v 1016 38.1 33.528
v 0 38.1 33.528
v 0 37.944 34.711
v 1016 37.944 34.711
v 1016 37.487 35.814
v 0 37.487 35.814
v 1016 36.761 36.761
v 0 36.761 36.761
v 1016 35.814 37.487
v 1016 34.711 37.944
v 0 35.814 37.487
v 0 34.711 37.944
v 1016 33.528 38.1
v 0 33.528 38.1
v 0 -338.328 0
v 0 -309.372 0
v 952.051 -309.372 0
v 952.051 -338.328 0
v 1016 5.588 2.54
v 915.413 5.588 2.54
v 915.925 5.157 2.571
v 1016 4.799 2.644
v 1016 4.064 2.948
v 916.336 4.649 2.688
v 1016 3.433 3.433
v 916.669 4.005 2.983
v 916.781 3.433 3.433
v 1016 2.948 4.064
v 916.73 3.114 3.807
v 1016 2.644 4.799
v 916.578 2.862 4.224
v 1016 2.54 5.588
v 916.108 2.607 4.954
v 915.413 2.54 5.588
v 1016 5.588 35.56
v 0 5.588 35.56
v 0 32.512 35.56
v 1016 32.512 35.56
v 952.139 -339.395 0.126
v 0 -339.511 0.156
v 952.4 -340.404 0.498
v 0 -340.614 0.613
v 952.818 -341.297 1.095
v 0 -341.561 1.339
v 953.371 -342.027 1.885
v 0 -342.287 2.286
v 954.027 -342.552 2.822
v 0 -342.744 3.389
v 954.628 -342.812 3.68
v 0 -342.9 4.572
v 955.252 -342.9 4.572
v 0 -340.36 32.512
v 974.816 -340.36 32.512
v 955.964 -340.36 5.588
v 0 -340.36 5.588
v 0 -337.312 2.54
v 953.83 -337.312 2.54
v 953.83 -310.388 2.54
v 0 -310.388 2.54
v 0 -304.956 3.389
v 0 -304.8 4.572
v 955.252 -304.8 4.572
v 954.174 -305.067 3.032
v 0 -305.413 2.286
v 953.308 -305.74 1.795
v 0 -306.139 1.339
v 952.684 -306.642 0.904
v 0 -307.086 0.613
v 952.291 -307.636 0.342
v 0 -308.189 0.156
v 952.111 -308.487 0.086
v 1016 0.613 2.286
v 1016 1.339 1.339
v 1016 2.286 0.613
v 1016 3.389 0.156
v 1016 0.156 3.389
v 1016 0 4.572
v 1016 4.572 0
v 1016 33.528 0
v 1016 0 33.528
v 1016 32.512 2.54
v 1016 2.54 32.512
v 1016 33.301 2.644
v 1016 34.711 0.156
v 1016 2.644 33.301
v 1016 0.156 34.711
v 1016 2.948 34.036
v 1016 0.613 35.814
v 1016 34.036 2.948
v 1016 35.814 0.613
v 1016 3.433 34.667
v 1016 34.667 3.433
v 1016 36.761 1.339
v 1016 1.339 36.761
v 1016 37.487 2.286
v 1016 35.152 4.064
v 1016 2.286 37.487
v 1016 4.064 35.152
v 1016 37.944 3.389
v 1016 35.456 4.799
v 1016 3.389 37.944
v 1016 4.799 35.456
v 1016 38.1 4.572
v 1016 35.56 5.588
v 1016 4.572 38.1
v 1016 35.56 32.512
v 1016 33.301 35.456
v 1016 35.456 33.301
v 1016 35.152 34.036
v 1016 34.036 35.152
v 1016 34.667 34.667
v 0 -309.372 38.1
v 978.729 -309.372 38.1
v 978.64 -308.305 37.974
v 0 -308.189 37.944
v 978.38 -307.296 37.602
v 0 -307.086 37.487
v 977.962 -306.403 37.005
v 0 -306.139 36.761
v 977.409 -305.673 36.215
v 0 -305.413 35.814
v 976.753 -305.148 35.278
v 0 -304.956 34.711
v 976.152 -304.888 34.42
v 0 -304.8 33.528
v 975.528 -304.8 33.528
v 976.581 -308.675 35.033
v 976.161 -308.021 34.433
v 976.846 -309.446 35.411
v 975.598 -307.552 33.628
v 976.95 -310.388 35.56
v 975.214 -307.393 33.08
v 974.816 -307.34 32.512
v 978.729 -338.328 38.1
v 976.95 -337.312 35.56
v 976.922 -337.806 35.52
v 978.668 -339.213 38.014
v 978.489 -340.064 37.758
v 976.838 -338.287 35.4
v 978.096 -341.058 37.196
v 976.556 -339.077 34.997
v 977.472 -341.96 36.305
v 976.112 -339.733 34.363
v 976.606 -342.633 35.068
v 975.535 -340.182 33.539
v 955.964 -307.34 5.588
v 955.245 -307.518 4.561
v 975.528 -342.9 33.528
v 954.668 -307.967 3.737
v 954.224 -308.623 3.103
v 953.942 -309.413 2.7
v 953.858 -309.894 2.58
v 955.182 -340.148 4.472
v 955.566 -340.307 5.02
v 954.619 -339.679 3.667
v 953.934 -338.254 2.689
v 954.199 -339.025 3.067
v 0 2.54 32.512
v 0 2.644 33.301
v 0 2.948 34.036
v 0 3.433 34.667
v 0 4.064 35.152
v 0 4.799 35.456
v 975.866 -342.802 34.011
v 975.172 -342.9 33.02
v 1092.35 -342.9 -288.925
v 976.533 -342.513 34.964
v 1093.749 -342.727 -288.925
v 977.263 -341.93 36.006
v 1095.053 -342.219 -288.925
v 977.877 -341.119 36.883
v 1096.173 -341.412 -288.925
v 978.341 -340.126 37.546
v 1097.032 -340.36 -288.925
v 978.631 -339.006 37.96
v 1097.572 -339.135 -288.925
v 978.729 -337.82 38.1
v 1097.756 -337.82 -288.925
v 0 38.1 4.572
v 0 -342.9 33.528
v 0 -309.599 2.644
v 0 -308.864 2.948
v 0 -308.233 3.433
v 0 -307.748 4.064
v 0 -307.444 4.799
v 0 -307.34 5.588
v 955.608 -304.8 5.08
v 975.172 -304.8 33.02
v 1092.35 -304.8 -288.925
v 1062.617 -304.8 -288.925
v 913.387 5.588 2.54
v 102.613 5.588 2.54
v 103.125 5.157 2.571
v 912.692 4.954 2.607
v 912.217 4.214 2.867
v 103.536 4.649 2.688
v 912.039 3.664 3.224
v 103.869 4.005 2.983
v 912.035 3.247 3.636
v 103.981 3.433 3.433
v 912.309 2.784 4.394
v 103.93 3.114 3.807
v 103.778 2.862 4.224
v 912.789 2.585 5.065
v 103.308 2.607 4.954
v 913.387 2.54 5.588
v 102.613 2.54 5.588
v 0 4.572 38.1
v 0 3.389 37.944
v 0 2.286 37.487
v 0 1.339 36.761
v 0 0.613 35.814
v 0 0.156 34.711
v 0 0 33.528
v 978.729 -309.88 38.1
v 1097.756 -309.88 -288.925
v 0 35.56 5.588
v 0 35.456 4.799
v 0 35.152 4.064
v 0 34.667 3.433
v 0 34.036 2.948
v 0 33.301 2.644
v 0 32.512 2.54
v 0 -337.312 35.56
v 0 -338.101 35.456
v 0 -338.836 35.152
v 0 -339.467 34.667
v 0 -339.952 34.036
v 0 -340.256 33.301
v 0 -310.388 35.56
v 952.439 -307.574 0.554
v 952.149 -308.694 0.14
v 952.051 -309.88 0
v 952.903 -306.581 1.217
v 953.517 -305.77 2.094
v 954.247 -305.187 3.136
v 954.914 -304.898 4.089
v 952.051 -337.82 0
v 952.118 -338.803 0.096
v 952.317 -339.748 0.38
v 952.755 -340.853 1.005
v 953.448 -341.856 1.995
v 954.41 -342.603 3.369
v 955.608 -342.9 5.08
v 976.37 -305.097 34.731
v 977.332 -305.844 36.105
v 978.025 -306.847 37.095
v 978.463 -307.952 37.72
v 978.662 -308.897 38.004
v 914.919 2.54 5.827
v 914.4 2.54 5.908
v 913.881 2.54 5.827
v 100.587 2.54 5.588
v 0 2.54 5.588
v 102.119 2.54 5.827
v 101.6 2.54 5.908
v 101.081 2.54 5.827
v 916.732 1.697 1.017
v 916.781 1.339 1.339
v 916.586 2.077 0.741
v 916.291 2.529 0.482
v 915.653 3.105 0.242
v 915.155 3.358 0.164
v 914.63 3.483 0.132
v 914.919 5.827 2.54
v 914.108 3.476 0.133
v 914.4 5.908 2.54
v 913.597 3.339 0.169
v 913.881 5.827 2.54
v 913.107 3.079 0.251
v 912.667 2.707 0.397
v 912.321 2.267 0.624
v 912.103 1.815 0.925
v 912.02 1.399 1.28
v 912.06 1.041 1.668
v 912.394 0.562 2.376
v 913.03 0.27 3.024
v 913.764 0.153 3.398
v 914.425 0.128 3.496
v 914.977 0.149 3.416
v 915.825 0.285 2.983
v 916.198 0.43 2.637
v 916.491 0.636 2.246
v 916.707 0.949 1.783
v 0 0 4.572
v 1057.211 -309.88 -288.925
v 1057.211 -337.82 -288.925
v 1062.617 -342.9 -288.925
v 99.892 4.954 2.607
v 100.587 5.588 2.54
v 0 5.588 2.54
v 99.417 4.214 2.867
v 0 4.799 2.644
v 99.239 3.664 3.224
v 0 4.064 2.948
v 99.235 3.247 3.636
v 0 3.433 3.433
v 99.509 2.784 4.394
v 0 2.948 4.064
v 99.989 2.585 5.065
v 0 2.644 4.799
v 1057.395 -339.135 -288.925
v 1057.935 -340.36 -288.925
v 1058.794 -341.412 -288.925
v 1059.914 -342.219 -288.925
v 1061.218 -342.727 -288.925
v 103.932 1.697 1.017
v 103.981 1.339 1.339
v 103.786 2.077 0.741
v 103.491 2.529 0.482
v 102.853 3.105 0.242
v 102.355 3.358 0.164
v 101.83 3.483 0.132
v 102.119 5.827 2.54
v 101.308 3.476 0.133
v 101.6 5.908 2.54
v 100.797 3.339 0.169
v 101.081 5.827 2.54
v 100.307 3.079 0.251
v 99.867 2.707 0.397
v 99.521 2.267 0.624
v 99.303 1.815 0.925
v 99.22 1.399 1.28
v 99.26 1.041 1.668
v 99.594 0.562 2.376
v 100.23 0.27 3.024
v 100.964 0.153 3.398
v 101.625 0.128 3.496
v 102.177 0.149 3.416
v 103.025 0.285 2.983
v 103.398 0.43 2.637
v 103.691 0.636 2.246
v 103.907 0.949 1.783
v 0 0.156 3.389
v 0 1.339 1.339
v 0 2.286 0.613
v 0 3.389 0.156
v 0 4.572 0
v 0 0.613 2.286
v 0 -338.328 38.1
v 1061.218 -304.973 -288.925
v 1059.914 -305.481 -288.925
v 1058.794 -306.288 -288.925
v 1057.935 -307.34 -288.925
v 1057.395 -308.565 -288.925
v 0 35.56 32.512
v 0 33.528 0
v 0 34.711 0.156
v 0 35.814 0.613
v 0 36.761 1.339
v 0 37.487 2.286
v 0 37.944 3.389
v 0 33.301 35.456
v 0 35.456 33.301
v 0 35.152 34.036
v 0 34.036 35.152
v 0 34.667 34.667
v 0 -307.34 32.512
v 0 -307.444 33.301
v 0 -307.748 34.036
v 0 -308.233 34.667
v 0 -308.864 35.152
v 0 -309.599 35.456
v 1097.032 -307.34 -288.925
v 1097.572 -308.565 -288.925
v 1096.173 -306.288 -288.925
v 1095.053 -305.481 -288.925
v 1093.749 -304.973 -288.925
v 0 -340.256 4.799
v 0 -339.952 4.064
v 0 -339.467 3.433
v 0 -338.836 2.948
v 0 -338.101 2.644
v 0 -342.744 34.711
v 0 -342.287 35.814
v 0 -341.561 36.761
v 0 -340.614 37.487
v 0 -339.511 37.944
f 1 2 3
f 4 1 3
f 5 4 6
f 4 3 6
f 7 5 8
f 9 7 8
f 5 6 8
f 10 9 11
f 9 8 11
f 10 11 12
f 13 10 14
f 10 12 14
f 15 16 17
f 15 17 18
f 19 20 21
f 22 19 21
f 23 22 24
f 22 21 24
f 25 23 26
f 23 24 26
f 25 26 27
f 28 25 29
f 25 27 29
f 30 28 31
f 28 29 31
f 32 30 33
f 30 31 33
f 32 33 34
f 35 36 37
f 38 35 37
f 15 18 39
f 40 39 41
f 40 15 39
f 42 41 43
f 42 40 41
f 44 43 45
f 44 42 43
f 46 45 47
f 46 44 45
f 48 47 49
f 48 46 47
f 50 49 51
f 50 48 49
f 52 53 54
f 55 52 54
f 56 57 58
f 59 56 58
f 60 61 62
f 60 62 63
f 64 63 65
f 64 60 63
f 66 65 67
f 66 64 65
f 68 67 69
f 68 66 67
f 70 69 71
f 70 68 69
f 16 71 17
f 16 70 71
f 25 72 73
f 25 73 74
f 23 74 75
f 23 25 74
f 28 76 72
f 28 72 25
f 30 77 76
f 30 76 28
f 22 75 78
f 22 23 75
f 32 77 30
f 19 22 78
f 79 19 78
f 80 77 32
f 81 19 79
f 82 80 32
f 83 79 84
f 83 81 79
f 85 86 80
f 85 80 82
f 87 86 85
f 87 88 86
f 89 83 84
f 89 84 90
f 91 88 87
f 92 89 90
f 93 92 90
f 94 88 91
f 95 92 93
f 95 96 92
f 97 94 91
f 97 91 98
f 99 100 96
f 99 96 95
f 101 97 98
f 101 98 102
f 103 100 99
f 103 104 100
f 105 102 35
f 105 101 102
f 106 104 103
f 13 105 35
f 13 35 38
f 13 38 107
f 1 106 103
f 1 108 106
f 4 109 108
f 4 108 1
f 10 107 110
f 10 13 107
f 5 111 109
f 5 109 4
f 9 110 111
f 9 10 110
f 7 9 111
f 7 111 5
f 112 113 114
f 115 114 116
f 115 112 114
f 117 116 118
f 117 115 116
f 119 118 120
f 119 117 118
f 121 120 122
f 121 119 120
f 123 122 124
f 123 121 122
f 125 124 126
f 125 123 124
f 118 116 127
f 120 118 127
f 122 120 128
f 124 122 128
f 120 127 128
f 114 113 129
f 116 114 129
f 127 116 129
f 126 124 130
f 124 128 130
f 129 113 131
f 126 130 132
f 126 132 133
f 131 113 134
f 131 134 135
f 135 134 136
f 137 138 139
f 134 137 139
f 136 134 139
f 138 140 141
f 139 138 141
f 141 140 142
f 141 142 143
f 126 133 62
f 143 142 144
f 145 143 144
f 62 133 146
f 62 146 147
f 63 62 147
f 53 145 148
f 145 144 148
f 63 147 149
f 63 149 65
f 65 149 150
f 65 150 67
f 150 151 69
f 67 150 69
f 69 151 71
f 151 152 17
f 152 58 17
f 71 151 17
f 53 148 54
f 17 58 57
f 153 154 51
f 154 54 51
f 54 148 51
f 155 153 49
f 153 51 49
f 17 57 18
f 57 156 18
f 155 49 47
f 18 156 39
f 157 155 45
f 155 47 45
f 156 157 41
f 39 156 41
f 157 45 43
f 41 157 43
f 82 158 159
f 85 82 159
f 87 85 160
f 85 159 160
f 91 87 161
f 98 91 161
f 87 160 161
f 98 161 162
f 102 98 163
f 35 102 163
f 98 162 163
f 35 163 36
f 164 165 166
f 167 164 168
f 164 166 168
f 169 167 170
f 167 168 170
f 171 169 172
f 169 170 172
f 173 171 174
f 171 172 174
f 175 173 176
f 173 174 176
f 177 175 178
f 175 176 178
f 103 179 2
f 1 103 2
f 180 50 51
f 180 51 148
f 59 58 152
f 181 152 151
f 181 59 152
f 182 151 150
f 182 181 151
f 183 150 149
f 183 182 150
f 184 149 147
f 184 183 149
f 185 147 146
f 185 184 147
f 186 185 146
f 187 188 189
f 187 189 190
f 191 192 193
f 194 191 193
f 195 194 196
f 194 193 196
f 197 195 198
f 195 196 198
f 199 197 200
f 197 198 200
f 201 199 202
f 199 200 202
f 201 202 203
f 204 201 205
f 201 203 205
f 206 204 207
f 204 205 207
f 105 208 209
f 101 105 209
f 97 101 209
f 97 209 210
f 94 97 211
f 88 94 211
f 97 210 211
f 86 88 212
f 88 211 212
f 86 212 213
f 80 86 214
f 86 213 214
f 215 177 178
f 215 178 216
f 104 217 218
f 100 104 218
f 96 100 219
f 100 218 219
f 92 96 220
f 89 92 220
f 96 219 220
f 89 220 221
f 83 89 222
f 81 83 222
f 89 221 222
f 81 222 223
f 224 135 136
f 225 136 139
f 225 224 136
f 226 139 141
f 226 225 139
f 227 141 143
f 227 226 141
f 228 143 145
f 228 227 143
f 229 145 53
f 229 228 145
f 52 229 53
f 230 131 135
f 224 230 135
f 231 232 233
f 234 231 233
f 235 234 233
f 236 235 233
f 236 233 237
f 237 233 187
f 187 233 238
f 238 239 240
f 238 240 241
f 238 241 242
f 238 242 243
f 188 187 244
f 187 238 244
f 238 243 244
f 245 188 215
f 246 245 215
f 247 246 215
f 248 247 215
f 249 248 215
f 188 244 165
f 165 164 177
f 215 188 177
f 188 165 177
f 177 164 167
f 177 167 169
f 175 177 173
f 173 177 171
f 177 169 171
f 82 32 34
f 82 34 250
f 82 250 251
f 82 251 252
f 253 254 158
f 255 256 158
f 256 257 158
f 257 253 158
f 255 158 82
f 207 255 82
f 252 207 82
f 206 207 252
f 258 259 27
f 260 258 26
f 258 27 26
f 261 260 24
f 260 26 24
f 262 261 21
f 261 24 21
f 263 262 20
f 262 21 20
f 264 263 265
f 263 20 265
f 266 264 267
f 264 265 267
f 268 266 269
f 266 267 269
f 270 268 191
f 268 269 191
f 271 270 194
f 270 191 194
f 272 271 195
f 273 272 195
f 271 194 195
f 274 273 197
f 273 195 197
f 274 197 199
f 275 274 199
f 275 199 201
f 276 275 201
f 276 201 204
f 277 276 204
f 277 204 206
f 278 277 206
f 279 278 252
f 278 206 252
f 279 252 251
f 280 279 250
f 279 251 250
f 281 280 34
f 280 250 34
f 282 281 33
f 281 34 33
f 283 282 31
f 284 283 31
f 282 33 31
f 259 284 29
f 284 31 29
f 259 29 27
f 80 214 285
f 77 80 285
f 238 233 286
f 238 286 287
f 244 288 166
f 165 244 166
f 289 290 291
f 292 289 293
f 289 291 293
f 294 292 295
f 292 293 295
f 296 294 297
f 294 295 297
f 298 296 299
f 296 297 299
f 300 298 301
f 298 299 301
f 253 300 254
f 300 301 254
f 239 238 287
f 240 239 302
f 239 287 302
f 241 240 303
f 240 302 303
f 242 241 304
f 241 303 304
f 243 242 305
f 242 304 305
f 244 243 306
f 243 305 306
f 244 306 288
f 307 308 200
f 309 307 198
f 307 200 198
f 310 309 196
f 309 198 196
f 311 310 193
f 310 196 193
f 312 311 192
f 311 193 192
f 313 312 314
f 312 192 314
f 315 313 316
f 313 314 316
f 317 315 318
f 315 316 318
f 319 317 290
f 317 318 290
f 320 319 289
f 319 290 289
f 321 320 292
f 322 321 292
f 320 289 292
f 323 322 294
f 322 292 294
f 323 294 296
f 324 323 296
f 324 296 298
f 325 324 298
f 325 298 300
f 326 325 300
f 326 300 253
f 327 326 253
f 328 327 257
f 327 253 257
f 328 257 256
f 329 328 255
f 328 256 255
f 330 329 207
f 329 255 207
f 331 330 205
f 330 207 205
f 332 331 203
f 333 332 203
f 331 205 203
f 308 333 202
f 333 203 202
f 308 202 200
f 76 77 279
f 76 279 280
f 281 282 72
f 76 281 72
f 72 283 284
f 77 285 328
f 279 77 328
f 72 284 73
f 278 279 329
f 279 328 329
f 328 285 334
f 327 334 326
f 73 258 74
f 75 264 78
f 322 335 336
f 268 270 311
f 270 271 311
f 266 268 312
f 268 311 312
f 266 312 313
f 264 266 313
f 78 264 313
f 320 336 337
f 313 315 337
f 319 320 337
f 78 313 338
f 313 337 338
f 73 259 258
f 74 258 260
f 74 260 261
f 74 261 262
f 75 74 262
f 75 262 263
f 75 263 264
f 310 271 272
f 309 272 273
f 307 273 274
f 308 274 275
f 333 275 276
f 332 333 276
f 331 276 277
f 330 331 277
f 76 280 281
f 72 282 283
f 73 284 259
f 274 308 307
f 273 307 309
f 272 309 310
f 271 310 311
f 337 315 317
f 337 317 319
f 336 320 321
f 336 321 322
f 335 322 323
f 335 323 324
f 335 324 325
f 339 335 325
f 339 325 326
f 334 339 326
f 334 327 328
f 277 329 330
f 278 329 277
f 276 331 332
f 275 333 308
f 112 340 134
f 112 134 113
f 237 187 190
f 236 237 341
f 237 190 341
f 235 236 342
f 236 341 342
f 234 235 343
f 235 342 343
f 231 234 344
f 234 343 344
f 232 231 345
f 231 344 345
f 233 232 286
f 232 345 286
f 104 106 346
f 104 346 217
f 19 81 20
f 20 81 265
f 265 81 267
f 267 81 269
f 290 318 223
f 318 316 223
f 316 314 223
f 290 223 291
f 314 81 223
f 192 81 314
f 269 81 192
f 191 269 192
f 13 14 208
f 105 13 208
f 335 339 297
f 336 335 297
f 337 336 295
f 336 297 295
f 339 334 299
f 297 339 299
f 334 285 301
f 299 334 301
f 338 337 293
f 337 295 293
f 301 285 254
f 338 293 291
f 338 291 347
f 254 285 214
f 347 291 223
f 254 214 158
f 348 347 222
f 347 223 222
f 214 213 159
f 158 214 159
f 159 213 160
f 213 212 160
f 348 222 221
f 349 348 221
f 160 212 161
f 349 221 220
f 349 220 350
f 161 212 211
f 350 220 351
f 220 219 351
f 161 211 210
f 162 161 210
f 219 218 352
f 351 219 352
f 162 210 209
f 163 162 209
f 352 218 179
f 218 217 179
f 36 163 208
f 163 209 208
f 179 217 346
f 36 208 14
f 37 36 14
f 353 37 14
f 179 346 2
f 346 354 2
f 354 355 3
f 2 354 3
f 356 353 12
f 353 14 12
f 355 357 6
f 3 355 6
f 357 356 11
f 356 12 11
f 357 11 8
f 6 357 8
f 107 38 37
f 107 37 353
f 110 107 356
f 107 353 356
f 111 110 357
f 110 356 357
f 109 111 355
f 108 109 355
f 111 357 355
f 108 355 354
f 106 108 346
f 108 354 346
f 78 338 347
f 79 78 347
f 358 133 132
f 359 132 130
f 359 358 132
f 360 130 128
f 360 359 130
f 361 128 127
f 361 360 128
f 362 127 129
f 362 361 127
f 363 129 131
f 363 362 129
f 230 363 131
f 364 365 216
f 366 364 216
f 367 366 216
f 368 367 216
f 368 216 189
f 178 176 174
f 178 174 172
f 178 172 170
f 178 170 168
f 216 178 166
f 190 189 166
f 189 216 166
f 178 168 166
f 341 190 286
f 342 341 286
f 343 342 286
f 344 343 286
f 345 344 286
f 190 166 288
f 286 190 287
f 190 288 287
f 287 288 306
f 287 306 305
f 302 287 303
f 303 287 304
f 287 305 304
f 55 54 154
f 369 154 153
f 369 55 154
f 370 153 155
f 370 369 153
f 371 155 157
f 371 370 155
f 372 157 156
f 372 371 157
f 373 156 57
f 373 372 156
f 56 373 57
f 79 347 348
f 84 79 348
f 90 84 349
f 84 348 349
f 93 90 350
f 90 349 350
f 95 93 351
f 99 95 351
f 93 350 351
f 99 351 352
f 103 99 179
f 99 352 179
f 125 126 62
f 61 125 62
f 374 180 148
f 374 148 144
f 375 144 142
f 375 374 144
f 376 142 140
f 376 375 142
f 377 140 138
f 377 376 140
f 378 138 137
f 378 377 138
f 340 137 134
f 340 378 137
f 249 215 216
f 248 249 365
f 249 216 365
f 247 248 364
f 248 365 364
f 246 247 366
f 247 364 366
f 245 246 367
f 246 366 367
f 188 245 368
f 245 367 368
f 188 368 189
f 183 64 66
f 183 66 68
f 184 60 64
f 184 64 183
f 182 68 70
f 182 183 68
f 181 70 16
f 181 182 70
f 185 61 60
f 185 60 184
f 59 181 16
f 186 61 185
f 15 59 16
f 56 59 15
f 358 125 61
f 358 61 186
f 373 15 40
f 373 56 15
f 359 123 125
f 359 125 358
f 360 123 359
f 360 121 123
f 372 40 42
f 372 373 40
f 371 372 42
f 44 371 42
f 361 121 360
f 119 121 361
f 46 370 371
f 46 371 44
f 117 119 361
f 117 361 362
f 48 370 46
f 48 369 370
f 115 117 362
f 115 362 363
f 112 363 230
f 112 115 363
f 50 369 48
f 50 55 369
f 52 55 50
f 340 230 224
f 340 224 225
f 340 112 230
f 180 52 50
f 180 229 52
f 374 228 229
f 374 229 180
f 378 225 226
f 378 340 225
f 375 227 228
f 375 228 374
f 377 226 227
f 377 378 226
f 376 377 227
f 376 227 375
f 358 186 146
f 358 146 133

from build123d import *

# Parameters (mm, degrees)
F1_DEPTH      = 1016
F6_R          = 2.38125
F7_DEPTH      = 25.4
F7_DEPTH_BACK = 25.4
F9_DEPTH      = 50.8
F10_DEPTH     = 50.8
F13_REACH     = 736.6402660348
F15_DEPTH     = 50.8


with BuildPart() as f1:
    # F0 (on Right) → F1 (new body)
    with BuildSketch(Plane.YZ):
        with BuildLine():
            ThreePointArc((0, 4.572), (1.3391077964, 1.3391077964), (4.572, 0))
            Line((4.572, 0), (33.528, 0))
            ThreePointArc((33.528, 0), (36.7608922036, 1.3391077964), (38.1, 4.572))
            Line((38.1, 4.572), (38.1, 33.528))
            ThreePointArc((38.1, 33.528), (36.7608922036, 36.7608922036), (33.528, 38.1))
            Line((33.528, 38.1), (4.572, 38.1))
            ThreePointArc((4.572, 38.1), (1.3391077964, 36.7608922036), (0, 33.528))
            Line((0, 33.528), (0, 4.572))
        make_face()
        with BuildLine():
            ThreePointArc((2.54, 32.512), (3.4327385309, 34.6672614691), (5.588, 35.56))
            Line((5.588, 35.56), (32.512, 35.56))
            ThreePointArc((32.512, 35.56), (34.6672614691, 34.6672614691), (35.56, 32.512))
            Line((35.56, 32.512), (35.56, 5.588))
            ThreePointArc((35.56, 5.588), (34.6672614691, 3.4327385309), (32.512, 2.54))
            Line((32.512, 2.54), (5.588, 2.54))
            ThreePointArc((5.588, 2.54), (3.4327385309, 3.4327385309), (2.54, 5.588))
            Line((2.54, 5.588), (2.54, 32.512))
        make_face(mode=Mode.SUBTRACT)
    extrude(amount=F1_DEPTH)


with BuildPart() as f3_1:
    # F3: instance of F1
    add(f1.part.mirror(Plane.XZ.offset(152.4)))

    # F8 (on face) → F9 (cut)
    with BuildSketch(Plane.XZ.offset(342.9)):
        Polygon((978.7288841391, 38.1), (952.0509769333, 0), (947.5085139275, -15.6161198393), (957.4878247443, -14.9376165936), (997.0538689515, -12.2474819838), (1035.239190855, -9.6512240536), (1040.9219264984, 51.4345876873), (1012.4167203903, 54.0863908827), align=None)
    extrude(amount=-F9_DEPTH, mode=Mode.SUBTRACT)


with BuildPart() as f1_1:
    add(f1.part)

    # F6 (on 3pt) → F7 (cut, two sides)
    with BuildSketch(Plane(origin=(0, 2.286, 2.286), x_dir=(1, 0, 0), z_dir=(0, 0.7071067812, 0.7071067812))) as f7_sk:
        with Locations((914.4, 0)):
            Circle(F6_R)
        with Locations((101.6, 0)):
            Circle(F6_R)
    extrude(amount=-F7_DEPTH, mode=Mode.SUBTRACT)
    extrude(f7_sk.sketch, amount=F7_DEPTH_BACK, mode=Mode.SUBTRACT)

    # F8 (on face) → F10 (cut)
    with BuildSketch(Plane.XZ.offset(342.9)):
        Polygon((978.7288841391, 38.1), (952.0509769333, 0), (947.5085139275, -15.6161198393), (957.4878247443, -14.9376165936), (997.0538689515, -12.2474819838), (1035.239190855, -9.6512240536), (1040.9219264984, 51.4345876873), (1012.4167203903, 54.0863908827), align=None)
    extrude(amount=-F10_DEPTH, mode=Mode.SUBTRACT)


with BuildPart() as f13:
    f13_end = Plane(origin=(965.3899305362, -323.85, 19.05), x_dir=(0.5735764364, 0, 0.8191520443), z_dir=(0.8191520443, 0, -0.5735764364))
    # F12 (on line) → F13 (new body, up to a plane its end follows)
    with BuildSketch(Plane(origin=(221.2717924585, 0, -607.9392533421), x_dir=(0.9396926208, 0, 0.3420201433), z_dir=(-0.3420201433, 0, 0.9396926208))):
        with BuildLine():
            ThreePointArc((927.6552776362, -342.9), (931.2473800847, -341.4121024484), (932.7352776362, -337.82))
            Line((932.7352776362, -337.82), (932.7352776362, -309.88))
            ThreePointArc((932.7352776362, -309.88), (931.2473800847, -306.2878975516), (927.6552776362, -304.8))
            Line((927.6552776362, -304.8), (899.7152776362, -304.8))
            ThreePointArc((899.7152776362, -304.8), (896.1231751878, -306.2878975516), (894.6352776362, -309.88))
            Line((894.6352776362, -309.88), (894.6352776362, -337.82))
            ThreePointArc((894.6352776362, -337.82), (896.1231751878, -341.4121024484), (899.7152776362, -342.9))
            Line((899.7152776362, -342.9), (927.6552776362, -342.9))
        make_face()
    f13_long = extrude(amount=F13_REACH, mode=Mode.PRIVATE)
    add(split(f13_long, bisect_by=f13_end, keep=Keep.TOP, mode=Mode.PRIVATE))

    # F14 (on face) → F15 (cut)
    with BuildSketch(Plane.XZ.offset(342.9)):
        Polygon((1097.75625, -288.925), (1018.38125, -288.925), (1040.6295061111, -307.8373670578), (1091.3935899734, -315.6994581223), align=None)
    extrude(amount=-F15_DEPTH, mode=Mode.SUBTRACT)


solid = Compound([f3_1.part, f1_1.part, f13.part])
